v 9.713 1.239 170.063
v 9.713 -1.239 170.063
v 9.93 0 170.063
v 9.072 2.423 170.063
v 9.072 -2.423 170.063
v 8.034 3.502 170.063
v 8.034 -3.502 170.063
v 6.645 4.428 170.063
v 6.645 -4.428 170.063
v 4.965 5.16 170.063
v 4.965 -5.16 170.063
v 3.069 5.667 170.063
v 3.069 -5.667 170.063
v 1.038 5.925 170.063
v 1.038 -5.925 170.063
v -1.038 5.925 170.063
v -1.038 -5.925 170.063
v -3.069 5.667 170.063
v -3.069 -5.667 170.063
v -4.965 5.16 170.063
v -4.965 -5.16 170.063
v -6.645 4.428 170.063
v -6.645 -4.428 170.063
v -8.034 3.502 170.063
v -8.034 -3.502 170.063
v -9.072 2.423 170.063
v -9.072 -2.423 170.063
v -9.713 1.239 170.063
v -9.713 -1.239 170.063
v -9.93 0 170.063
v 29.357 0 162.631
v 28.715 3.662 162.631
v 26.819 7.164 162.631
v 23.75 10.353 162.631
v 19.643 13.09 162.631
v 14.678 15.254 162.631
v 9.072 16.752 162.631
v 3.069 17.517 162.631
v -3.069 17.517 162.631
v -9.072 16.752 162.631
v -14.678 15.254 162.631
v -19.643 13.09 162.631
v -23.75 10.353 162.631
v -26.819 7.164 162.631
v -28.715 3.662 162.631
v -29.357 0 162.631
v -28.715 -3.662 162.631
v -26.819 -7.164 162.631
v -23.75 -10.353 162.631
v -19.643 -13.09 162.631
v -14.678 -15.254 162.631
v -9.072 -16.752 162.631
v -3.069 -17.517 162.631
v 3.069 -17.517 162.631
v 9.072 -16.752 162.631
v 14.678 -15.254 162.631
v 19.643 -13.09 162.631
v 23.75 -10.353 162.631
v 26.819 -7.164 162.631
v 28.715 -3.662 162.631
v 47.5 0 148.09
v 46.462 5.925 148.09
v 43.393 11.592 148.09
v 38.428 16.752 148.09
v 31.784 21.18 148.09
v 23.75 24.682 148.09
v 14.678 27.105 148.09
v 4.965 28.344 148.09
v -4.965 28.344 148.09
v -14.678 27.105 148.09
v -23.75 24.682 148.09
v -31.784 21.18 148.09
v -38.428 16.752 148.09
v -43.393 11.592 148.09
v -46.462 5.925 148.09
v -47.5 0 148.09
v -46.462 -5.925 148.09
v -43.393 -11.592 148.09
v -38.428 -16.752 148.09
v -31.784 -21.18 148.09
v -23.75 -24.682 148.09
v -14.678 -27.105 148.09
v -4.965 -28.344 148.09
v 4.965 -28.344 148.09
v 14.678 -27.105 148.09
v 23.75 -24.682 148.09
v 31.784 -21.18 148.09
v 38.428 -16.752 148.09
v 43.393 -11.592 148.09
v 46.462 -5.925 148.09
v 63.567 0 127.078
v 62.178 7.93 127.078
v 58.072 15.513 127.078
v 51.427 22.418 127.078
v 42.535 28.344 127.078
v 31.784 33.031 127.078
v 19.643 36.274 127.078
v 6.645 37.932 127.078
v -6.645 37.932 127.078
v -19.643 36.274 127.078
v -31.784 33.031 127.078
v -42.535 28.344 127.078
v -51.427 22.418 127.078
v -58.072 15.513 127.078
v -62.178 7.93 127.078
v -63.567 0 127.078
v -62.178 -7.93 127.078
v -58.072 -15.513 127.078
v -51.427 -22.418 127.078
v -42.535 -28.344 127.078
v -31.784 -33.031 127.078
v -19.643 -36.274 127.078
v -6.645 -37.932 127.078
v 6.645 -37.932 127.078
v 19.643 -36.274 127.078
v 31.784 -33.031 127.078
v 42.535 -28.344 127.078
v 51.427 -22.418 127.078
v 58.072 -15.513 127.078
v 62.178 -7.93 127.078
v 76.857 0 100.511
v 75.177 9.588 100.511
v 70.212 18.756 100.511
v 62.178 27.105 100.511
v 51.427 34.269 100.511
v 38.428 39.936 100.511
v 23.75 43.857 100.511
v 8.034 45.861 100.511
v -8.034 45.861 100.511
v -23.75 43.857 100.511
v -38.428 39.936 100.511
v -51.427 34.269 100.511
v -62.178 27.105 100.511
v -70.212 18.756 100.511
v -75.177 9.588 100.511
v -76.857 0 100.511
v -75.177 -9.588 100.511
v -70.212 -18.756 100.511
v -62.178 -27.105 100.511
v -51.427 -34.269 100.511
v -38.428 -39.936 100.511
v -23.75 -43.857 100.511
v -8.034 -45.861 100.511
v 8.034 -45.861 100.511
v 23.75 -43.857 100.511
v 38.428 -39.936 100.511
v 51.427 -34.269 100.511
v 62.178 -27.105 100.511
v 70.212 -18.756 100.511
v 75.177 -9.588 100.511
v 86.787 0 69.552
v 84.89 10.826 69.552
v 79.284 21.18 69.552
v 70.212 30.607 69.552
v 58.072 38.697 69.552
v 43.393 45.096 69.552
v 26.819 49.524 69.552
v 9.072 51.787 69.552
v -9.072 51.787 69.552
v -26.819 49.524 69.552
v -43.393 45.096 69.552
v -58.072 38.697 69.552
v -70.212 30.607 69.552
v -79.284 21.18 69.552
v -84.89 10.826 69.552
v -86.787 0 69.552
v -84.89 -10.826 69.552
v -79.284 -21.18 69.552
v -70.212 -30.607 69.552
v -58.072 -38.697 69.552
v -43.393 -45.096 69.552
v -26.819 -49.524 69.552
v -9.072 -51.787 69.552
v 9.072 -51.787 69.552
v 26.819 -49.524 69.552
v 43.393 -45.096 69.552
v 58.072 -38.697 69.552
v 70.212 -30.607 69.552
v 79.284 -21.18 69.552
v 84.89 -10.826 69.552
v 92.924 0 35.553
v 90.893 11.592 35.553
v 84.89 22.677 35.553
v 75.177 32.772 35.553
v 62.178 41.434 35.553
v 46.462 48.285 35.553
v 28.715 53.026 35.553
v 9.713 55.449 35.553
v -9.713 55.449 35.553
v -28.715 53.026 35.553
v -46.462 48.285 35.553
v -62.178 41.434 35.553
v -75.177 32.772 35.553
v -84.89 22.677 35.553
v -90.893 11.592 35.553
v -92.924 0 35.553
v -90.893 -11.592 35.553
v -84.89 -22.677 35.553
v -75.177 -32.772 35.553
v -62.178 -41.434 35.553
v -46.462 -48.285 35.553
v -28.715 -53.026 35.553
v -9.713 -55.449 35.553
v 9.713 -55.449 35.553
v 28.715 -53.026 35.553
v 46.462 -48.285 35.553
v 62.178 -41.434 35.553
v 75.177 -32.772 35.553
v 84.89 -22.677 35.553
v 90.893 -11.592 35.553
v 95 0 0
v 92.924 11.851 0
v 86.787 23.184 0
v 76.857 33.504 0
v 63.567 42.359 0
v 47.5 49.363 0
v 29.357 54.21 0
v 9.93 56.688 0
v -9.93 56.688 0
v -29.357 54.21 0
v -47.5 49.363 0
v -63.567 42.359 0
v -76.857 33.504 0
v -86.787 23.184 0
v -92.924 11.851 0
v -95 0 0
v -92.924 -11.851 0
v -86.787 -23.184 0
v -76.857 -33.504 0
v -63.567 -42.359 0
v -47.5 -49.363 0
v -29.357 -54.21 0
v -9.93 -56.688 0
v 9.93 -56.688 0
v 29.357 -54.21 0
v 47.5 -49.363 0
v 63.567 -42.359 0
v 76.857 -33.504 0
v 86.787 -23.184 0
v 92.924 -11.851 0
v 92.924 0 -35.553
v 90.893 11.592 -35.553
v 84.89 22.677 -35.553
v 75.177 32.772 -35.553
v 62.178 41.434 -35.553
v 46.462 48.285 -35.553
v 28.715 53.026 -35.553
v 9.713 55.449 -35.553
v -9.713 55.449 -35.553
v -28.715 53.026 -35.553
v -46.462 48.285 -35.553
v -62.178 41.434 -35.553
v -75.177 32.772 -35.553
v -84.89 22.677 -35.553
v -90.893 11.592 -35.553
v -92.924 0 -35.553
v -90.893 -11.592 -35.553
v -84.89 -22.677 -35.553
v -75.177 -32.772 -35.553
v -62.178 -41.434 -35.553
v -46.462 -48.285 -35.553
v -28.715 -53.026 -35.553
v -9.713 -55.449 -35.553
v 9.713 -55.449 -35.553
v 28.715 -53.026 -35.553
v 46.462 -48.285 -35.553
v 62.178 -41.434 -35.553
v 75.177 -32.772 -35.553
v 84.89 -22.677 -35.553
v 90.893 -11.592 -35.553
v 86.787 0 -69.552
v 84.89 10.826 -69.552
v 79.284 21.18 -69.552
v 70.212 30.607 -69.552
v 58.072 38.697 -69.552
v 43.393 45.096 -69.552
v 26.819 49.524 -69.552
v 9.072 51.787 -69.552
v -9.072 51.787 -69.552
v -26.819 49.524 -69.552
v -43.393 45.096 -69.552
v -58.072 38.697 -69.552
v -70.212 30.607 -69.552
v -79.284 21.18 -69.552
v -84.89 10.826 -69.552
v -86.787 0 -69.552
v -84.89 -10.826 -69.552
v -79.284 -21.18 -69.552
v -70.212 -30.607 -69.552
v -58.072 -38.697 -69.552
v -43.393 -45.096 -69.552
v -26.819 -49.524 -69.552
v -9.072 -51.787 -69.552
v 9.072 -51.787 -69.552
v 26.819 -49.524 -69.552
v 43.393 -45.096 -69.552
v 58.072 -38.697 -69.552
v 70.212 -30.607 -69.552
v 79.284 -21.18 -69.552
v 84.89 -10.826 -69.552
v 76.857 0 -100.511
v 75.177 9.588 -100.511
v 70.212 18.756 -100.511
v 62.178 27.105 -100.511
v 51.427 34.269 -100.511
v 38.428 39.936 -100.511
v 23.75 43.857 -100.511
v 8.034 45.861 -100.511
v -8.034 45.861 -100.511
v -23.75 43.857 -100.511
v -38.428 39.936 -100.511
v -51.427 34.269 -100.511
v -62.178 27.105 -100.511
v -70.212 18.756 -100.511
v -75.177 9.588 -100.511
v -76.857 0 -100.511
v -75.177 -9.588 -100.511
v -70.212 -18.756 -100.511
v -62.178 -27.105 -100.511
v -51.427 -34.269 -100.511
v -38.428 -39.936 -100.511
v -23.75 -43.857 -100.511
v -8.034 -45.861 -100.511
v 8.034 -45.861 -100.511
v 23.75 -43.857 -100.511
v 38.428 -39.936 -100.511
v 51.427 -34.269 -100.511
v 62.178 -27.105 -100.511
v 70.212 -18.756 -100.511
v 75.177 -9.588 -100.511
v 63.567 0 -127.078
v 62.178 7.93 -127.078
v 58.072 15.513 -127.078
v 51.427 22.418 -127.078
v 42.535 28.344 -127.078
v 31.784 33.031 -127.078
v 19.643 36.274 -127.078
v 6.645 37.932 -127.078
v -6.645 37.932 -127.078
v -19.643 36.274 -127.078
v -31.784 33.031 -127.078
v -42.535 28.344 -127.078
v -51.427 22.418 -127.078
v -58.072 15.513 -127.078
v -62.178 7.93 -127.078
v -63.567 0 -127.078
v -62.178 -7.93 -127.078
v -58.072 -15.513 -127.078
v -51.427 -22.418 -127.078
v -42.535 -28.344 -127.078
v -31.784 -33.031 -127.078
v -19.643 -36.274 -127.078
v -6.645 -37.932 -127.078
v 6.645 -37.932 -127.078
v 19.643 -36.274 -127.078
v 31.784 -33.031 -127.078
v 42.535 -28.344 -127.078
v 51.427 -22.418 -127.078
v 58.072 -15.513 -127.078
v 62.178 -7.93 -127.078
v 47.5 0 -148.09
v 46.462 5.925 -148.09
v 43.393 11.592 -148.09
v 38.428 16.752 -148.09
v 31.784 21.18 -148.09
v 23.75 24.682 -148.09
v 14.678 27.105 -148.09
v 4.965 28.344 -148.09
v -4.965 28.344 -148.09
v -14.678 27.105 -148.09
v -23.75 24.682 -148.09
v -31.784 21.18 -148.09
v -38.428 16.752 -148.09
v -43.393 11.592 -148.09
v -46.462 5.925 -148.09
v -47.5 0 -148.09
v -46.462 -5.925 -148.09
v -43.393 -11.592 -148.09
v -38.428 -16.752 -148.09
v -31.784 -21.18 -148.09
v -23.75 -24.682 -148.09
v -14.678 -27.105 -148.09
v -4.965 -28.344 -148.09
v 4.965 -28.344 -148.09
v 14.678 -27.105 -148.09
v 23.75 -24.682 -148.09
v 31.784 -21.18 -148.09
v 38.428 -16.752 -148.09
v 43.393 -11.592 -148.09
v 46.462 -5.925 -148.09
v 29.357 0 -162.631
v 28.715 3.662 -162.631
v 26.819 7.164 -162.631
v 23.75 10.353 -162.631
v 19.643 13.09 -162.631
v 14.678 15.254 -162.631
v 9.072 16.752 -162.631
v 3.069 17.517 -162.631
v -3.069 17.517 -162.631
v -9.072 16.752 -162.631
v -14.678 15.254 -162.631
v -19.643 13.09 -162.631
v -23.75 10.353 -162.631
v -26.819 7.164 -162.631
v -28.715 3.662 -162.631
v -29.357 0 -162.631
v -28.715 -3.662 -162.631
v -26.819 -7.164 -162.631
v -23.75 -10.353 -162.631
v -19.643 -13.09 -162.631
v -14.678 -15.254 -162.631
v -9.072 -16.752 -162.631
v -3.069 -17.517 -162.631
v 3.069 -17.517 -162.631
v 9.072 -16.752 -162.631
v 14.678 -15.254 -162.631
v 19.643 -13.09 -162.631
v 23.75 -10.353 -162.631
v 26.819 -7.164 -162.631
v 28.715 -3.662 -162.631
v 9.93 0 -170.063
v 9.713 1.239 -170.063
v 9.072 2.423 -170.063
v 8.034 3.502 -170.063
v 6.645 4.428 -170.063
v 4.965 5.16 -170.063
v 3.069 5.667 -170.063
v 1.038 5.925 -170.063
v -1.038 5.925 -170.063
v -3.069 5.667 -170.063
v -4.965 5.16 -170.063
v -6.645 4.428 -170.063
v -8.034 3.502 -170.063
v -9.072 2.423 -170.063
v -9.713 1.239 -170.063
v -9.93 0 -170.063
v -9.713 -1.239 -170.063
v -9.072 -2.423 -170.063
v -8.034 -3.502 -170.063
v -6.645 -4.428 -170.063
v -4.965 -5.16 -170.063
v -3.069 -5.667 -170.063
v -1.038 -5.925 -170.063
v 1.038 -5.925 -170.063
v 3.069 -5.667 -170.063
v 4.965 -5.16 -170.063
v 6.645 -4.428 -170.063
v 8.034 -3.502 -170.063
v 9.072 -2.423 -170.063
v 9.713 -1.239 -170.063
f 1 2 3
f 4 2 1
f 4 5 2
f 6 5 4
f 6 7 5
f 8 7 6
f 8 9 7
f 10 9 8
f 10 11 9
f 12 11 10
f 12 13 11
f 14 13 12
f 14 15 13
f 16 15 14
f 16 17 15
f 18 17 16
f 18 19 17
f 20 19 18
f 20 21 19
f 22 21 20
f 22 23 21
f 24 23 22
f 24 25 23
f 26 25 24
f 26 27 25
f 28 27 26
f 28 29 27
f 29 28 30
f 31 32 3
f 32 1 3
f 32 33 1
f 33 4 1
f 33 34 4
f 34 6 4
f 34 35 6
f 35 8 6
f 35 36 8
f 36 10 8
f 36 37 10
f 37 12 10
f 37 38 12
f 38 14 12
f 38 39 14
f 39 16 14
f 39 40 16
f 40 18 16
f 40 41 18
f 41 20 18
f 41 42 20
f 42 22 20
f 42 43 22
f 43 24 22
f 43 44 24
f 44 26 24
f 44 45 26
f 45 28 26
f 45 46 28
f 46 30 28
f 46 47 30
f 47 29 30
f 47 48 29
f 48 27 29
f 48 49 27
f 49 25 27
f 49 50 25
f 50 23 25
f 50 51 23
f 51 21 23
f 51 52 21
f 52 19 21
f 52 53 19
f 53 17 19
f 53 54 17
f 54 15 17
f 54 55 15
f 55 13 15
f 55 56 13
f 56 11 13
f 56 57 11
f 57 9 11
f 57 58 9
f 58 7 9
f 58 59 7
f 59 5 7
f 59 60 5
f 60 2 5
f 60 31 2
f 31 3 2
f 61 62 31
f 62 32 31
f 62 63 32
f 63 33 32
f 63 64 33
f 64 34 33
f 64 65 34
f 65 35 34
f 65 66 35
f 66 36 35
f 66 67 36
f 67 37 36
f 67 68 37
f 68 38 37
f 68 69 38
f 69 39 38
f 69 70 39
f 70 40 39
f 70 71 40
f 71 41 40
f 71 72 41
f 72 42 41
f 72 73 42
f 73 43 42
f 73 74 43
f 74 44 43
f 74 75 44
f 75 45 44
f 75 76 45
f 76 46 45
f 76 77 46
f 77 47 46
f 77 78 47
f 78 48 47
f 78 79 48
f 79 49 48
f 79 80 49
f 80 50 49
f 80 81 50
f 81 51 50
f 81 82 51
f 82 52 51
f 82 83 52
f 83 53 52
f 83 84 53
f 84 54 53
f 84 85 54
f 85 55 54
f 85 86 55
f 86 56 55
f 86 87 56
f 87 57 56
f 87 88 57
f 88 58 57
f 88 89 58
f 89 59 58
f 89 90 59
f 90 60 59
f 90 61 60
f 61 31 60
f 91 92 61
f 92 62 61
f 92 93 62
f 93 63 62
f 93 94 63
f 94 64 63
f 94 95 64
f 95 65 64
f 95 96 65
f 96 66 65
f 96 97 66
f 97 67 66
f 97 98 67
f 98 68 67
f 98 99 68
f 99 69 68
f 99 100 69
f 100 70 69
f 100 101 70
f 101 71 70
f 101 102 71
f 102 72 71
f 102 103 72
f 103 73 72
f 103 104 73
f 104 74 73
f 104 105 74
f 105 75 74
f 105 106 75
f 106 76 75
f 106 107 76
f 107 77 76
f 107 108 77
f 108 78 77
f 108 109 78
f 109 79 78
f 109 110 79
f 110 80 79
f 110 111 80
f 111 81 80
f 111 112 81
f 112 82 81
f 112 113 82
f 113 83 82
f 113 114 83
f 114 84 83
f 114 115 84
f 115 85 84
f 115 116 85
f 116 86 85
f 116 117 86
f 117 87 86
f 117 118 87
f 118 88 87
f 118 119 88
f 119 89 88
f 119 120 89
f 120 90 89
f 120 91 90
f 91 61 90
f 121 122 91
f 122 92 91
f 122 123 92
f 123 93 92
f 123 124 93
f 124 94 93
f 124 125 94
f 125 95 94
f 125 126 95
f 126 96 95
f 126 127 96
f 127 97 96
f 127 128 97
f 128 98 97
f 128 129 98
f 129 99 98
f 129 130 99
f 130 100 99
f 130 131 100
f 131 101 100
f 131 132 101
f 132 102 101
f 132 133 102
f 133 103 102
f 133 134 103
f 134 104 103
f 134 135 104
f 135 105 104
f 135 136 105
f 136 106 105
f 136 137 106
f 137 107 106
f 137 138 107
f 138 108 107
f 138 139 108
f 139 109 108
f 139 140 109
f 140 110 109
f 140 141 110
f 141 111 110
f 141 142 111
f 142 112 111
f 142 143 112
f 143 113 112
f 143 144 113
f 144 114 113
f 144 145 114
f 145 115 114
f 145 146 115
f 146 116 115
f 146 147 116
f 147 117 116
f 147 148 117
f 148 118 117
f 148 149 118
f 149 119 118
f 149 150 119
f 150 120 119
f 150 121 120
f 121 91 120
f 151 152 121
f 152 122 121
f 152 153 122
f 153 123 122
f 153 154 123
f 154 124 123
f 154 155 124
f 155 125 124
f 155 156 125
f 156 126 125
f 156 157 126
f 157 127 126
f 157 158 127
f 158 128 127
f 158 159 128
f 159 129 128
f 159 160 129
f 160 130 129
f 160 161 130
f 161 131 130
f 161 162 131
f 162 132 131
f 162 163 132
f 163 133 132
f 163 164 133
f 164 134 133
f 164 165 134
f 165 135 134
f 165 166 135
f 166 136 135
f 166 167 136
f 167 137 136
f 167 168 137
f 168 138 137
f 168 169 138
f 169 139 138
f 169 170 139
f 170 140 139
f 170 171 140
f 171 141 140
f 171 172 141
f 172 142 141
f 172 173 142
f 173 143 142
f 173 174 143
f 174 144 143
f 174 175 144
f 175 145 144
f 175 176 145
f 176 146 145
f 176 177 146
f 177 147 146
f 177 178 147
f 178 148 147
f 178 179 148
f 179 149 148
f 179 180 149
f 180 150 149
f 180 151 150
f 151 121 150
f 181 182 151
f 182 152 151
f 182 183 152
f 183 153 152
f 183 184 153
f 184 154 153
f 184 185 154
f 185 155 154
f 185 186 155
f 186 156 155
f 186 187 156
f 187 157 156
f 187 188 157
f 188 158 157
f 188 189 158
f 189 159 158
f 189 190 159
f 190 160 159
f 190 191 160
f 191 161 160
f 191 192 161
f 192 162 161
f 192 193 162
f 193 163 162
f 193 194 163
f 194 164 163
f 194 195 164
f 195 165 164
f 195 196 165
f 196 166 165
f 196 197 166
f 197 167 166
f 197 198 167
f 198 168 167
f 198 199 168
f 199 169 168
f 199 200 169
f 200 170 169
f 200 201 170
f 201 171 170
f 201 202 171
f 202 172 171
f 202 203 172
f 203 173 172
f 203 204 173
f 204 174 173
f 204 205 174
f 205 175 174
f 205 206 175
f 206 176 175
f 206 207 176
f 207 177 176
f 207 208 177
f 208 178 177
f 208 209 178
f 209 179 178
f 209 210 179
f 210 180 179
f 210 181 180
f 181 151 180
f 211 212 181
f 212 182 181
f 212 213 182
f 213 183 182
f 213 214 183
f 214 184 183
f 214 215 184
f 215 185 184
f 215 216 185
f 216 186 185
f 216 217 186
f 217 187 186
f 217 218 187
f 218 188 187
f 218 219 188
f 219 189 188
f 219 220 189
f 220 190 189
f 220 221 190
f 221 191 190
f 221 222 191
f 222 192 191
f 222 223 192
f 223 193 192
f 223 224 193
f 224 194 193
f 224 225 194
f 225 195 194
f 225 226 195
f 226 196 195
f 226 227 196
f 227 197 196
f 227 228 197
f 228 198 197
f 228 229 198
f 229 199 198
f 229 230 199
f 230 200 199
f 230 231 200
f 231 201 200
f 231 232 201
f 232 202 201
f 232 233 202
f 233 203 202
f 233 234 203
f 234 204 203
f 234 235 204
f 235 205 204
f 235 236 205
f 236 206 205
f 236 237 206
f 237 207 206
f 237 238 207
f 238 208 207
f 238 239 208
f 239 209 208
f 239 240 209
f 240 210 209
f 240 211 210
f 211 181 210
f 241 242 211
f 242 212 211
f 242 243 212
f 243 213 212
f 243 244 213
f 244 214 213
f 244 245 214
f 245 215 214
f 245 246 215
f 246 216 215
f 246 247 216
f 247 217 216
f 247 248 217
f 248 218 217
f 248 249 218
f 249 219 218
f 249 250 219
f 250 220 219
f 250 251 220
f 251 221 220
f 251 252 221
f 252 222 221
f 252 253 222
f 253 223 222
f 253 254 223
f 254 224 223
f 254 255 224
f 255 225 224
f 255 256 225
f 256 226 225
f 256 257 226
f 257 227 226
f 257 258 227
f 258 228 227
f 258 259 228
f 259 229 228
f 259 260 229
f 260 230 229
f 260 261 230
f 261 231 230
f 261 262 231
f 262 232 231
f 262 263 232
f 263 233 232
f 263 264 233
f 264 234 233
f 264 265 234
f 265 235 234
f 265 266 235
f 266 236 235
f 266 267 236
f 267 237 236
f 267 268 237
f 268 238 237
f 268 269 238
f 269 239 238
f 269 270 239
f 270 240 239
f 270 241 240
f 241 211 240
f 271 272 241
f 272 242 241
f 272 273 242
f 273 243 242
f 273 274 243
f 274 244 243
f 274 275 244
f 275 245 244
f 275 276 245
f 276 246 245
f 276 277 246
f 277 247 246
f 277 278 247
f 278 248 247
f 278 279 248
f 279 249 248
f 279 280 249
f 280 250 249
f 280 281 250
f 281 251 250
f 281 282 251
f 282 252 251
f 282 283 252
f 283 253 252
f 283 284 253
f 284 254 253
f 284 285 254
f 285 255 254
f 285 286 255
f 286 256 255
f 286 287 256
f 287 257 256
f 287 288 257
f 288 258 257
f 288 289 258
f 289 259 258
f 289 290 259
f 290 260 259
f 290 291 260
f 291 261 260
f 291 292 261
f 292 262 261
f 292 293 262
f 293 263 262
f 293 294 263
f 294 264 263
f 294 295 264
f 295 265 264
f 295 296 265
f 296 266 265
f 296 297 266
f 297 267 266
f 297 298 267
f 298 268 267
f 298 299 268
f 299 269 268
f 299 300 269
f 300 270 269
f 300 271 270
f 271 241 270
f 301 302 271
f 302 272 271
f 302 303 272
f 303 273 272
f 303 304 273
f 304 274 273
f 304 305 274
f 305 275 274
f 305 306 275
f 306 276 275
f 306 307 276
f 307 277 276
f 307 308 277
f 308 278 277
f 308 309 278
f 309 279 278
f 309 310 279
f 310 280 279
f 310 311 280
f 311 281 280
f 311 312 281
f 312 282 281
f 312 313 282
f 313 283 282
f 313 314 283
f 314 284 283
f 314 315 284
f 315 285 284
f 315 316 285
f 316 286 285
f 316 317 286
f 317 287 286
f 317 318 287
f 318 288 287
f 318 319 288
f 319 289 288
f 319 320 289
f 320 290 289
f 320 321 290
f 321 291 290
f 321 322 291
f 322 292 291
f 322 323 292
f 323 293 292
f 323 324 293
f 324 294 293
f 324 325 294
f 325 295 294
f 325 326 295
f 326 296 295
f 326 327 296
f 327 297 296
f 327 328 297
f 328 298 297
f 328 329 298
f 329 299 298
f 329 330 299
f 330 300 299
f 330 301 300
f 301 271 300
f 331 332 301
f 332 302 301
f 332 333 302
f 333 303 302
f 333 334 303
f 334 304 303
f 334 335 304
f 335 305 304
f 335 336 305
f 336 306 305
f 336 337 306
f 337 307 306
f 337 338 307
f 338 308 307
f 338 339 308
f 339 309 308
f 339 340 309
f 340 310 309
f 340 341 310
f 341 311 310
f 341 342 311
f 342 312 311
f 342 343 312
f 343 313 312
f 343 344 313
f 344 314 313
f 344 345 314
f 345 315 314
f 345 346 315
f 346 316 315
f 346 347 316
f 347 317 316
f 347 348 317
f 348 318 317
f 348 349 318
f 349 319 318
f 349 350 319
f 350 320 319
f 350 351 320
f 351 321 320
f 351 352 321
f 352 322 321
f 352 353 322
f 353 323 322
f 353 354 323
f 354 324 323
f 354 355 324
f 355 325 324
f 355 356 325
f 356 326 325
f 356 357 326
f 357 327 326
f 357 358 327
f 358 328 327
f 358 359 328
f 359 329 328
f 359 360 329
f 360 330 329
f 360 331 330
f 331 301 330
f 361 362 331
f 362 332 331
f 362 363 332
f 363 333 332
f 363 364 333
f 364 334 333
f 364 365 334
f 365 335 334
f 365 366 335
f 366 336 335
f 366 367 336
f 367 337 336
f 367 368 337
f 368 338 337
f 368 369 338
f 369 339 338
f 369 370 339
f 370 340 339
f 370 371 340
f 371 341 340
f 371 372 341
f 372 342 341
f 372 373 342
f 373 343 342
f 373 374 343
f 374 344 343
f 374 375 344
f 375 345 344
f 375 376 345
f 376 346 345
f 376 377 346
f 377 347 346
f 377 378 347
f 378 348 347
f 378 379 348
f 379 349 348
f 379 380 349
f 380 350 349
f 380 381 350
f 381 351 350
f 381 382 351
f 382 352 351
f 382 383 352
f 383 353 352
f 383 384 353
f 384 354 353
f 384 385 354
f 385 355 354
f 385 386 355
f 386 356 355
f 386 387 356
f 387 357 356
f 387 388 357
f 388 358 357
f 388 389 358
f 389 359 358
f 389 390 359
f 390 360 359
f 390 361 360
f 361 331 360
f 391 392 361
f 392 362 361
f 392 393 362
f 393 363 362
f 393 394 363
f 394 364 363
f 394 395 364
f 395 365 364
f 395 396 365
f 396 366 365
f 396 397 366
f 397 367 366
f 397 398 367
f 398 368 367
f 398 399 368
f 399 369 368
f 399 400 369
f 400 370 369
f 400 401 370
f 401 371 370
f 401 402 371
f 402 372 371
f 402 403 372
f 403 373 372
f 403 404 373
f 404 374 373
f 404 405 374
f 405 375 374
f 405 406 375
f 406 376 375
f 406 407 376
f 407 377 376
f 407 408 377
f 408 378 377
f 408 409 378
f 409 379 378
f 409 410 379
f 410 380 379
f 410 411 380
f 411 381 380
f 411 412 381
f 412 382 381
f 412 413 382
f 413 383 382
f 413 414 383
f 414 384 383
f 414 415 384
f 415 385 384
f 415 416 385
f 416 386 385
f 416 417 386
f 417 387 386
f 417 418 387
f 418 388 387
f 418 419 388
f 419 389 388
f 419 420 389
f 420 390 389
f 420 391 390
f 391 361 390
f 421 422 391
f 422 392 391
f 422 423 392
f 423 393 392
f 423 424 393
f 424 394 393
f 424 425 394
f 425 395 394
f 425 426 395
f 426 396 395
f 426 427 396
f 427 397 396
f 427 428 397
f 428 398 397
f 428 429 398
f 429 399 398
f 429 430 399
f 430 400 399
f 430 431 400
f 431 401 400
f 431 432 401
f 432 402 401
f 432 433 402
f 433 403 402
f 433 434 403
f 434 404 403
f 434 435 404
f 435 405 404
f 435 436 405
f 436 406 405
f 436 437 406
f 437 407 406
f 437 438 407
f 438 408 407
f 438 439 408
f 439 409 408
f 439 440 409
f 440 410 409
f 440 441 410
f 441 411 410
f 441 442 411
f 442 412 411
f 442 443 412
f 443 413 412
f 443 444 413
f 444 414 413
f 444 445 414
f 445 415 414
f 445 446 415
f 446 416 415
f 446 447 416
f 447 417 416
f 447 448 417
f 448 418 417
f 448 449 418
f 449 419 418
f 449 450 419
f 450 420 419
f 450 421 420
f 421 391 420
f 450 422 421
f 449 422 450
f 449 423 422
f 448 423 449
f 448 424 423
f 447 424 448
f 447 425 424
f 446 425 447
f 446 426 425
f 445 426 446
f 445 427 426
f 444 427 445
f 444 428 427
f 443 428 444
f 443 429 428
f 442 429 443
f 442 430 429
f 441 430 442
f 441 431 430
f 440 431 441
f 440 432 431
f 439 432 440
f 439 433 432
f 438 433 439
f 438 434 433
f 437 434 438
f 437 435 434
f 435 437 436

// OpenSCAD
// Generated by SolidPython 1.0.1 on 2020-07-29 00:46:46


scale(v = [5, 3, 9]) {
	sphere(r = 19);
}
/***********************************************
*********      SolidPython code:      **********
************************************************
 
# import packages: SolidPython
from solid import *
from solid.utils import *
from itertools import chain, combinations, permutations


class Resize:

    def __init__(self, scad_file):
        self.scad_file = scad_file
        #self.scad_file = import_scad(scad_file)
        # cone/cylinder param:
        self.r1 = 0
        self.r2 = 0
        self.h = 0
        # rectangular prism param:
        self.w = 0
        self.l = 0
        # ellipse param:
        self.r = 0

    # import OpenScad code (file name corresponds to shape)


    # classify shape + parameters
    def assign(self, param1, param2, param3):
        if self.scad_file == 'cone.scad':
            self.r1 = param1
            self.r2 = param2
            self.h = param3
        elif self.scad_file == 'cylinder.scad':
            self.r1 = param1
            self.r2 = param2
            self.h = param3
        elif self.scad_file == 'rectangularPrism.scad':
            self.h = param1
            self.l = param2
            self.w = param3
        else:
            self.r = param1
            self.h = param2

    # resize parameters
    def iterate(self):
        x = range(3, 20, 2)
        i = 1
        if self.scad_file == 'cone.scad':
            tempList = list(permutations(x, 2))
            for temp in tempList:
                param1 = temp[0]
                param2 = temp[1]
                filepath = 'produced_scad_files/' + 'cone' + str(param1) + '_' + str(param2) + '_' + '.scad'
                scad_render_to_file(cylinder(h=param1, r1=param2, r2=0), filepath)

        elif self.scad_file == 'cylinder.scad':
            tempList = list(permutations(x, 3))
            for temp in tempList:
                param1 = temp[0]
                param2 = temp[1]
                filepath = 'produced_scad_files/' + 'cylinder' + str(param1) + '_' + str(param2) + '_' + '.scad'
                scad_render_to_file(cylinder(h=param1, r1=param2, r2=param2), filepath)

        elif self.scad_file == 'rectangularPrism.scad':
            tempList = list(permutations(x, 3))
            for temp in tempList:
                param1 = temp[0]
                param2 = temp[1]
                param3 = temp[2]
                filepath = 'produced_scad_files/' + 'rectangularPrism' + str(param1) + '_' + str(param2) + '_' + str(
                    param3) + '.scad'
                scad_render_to_file(cube(size=(param1, param2, param3)), filepath)

        elif self.scad_file == 'ellipse.scad':
            tempList = list(permutations(x, 4))
            for temp in tempList:
                param1 = temp[0]
                param2 = temp[1]
                param3 = temp[2]
                param4 = temp[3]
                filepath = 'produced_scad_files/' + 'ellipse' + str(param1) + '_' + str(param2) + '_' + str(param3) + '_' + str(param4) + '.scad'
                scad_render_to_file(scale([param1, param2, param3])(sphere(r=param4)), filepath)

    def render_to_scadfile(self):
        scad_render_to_file(scad, 'example.scad') 
 
************************************************/
